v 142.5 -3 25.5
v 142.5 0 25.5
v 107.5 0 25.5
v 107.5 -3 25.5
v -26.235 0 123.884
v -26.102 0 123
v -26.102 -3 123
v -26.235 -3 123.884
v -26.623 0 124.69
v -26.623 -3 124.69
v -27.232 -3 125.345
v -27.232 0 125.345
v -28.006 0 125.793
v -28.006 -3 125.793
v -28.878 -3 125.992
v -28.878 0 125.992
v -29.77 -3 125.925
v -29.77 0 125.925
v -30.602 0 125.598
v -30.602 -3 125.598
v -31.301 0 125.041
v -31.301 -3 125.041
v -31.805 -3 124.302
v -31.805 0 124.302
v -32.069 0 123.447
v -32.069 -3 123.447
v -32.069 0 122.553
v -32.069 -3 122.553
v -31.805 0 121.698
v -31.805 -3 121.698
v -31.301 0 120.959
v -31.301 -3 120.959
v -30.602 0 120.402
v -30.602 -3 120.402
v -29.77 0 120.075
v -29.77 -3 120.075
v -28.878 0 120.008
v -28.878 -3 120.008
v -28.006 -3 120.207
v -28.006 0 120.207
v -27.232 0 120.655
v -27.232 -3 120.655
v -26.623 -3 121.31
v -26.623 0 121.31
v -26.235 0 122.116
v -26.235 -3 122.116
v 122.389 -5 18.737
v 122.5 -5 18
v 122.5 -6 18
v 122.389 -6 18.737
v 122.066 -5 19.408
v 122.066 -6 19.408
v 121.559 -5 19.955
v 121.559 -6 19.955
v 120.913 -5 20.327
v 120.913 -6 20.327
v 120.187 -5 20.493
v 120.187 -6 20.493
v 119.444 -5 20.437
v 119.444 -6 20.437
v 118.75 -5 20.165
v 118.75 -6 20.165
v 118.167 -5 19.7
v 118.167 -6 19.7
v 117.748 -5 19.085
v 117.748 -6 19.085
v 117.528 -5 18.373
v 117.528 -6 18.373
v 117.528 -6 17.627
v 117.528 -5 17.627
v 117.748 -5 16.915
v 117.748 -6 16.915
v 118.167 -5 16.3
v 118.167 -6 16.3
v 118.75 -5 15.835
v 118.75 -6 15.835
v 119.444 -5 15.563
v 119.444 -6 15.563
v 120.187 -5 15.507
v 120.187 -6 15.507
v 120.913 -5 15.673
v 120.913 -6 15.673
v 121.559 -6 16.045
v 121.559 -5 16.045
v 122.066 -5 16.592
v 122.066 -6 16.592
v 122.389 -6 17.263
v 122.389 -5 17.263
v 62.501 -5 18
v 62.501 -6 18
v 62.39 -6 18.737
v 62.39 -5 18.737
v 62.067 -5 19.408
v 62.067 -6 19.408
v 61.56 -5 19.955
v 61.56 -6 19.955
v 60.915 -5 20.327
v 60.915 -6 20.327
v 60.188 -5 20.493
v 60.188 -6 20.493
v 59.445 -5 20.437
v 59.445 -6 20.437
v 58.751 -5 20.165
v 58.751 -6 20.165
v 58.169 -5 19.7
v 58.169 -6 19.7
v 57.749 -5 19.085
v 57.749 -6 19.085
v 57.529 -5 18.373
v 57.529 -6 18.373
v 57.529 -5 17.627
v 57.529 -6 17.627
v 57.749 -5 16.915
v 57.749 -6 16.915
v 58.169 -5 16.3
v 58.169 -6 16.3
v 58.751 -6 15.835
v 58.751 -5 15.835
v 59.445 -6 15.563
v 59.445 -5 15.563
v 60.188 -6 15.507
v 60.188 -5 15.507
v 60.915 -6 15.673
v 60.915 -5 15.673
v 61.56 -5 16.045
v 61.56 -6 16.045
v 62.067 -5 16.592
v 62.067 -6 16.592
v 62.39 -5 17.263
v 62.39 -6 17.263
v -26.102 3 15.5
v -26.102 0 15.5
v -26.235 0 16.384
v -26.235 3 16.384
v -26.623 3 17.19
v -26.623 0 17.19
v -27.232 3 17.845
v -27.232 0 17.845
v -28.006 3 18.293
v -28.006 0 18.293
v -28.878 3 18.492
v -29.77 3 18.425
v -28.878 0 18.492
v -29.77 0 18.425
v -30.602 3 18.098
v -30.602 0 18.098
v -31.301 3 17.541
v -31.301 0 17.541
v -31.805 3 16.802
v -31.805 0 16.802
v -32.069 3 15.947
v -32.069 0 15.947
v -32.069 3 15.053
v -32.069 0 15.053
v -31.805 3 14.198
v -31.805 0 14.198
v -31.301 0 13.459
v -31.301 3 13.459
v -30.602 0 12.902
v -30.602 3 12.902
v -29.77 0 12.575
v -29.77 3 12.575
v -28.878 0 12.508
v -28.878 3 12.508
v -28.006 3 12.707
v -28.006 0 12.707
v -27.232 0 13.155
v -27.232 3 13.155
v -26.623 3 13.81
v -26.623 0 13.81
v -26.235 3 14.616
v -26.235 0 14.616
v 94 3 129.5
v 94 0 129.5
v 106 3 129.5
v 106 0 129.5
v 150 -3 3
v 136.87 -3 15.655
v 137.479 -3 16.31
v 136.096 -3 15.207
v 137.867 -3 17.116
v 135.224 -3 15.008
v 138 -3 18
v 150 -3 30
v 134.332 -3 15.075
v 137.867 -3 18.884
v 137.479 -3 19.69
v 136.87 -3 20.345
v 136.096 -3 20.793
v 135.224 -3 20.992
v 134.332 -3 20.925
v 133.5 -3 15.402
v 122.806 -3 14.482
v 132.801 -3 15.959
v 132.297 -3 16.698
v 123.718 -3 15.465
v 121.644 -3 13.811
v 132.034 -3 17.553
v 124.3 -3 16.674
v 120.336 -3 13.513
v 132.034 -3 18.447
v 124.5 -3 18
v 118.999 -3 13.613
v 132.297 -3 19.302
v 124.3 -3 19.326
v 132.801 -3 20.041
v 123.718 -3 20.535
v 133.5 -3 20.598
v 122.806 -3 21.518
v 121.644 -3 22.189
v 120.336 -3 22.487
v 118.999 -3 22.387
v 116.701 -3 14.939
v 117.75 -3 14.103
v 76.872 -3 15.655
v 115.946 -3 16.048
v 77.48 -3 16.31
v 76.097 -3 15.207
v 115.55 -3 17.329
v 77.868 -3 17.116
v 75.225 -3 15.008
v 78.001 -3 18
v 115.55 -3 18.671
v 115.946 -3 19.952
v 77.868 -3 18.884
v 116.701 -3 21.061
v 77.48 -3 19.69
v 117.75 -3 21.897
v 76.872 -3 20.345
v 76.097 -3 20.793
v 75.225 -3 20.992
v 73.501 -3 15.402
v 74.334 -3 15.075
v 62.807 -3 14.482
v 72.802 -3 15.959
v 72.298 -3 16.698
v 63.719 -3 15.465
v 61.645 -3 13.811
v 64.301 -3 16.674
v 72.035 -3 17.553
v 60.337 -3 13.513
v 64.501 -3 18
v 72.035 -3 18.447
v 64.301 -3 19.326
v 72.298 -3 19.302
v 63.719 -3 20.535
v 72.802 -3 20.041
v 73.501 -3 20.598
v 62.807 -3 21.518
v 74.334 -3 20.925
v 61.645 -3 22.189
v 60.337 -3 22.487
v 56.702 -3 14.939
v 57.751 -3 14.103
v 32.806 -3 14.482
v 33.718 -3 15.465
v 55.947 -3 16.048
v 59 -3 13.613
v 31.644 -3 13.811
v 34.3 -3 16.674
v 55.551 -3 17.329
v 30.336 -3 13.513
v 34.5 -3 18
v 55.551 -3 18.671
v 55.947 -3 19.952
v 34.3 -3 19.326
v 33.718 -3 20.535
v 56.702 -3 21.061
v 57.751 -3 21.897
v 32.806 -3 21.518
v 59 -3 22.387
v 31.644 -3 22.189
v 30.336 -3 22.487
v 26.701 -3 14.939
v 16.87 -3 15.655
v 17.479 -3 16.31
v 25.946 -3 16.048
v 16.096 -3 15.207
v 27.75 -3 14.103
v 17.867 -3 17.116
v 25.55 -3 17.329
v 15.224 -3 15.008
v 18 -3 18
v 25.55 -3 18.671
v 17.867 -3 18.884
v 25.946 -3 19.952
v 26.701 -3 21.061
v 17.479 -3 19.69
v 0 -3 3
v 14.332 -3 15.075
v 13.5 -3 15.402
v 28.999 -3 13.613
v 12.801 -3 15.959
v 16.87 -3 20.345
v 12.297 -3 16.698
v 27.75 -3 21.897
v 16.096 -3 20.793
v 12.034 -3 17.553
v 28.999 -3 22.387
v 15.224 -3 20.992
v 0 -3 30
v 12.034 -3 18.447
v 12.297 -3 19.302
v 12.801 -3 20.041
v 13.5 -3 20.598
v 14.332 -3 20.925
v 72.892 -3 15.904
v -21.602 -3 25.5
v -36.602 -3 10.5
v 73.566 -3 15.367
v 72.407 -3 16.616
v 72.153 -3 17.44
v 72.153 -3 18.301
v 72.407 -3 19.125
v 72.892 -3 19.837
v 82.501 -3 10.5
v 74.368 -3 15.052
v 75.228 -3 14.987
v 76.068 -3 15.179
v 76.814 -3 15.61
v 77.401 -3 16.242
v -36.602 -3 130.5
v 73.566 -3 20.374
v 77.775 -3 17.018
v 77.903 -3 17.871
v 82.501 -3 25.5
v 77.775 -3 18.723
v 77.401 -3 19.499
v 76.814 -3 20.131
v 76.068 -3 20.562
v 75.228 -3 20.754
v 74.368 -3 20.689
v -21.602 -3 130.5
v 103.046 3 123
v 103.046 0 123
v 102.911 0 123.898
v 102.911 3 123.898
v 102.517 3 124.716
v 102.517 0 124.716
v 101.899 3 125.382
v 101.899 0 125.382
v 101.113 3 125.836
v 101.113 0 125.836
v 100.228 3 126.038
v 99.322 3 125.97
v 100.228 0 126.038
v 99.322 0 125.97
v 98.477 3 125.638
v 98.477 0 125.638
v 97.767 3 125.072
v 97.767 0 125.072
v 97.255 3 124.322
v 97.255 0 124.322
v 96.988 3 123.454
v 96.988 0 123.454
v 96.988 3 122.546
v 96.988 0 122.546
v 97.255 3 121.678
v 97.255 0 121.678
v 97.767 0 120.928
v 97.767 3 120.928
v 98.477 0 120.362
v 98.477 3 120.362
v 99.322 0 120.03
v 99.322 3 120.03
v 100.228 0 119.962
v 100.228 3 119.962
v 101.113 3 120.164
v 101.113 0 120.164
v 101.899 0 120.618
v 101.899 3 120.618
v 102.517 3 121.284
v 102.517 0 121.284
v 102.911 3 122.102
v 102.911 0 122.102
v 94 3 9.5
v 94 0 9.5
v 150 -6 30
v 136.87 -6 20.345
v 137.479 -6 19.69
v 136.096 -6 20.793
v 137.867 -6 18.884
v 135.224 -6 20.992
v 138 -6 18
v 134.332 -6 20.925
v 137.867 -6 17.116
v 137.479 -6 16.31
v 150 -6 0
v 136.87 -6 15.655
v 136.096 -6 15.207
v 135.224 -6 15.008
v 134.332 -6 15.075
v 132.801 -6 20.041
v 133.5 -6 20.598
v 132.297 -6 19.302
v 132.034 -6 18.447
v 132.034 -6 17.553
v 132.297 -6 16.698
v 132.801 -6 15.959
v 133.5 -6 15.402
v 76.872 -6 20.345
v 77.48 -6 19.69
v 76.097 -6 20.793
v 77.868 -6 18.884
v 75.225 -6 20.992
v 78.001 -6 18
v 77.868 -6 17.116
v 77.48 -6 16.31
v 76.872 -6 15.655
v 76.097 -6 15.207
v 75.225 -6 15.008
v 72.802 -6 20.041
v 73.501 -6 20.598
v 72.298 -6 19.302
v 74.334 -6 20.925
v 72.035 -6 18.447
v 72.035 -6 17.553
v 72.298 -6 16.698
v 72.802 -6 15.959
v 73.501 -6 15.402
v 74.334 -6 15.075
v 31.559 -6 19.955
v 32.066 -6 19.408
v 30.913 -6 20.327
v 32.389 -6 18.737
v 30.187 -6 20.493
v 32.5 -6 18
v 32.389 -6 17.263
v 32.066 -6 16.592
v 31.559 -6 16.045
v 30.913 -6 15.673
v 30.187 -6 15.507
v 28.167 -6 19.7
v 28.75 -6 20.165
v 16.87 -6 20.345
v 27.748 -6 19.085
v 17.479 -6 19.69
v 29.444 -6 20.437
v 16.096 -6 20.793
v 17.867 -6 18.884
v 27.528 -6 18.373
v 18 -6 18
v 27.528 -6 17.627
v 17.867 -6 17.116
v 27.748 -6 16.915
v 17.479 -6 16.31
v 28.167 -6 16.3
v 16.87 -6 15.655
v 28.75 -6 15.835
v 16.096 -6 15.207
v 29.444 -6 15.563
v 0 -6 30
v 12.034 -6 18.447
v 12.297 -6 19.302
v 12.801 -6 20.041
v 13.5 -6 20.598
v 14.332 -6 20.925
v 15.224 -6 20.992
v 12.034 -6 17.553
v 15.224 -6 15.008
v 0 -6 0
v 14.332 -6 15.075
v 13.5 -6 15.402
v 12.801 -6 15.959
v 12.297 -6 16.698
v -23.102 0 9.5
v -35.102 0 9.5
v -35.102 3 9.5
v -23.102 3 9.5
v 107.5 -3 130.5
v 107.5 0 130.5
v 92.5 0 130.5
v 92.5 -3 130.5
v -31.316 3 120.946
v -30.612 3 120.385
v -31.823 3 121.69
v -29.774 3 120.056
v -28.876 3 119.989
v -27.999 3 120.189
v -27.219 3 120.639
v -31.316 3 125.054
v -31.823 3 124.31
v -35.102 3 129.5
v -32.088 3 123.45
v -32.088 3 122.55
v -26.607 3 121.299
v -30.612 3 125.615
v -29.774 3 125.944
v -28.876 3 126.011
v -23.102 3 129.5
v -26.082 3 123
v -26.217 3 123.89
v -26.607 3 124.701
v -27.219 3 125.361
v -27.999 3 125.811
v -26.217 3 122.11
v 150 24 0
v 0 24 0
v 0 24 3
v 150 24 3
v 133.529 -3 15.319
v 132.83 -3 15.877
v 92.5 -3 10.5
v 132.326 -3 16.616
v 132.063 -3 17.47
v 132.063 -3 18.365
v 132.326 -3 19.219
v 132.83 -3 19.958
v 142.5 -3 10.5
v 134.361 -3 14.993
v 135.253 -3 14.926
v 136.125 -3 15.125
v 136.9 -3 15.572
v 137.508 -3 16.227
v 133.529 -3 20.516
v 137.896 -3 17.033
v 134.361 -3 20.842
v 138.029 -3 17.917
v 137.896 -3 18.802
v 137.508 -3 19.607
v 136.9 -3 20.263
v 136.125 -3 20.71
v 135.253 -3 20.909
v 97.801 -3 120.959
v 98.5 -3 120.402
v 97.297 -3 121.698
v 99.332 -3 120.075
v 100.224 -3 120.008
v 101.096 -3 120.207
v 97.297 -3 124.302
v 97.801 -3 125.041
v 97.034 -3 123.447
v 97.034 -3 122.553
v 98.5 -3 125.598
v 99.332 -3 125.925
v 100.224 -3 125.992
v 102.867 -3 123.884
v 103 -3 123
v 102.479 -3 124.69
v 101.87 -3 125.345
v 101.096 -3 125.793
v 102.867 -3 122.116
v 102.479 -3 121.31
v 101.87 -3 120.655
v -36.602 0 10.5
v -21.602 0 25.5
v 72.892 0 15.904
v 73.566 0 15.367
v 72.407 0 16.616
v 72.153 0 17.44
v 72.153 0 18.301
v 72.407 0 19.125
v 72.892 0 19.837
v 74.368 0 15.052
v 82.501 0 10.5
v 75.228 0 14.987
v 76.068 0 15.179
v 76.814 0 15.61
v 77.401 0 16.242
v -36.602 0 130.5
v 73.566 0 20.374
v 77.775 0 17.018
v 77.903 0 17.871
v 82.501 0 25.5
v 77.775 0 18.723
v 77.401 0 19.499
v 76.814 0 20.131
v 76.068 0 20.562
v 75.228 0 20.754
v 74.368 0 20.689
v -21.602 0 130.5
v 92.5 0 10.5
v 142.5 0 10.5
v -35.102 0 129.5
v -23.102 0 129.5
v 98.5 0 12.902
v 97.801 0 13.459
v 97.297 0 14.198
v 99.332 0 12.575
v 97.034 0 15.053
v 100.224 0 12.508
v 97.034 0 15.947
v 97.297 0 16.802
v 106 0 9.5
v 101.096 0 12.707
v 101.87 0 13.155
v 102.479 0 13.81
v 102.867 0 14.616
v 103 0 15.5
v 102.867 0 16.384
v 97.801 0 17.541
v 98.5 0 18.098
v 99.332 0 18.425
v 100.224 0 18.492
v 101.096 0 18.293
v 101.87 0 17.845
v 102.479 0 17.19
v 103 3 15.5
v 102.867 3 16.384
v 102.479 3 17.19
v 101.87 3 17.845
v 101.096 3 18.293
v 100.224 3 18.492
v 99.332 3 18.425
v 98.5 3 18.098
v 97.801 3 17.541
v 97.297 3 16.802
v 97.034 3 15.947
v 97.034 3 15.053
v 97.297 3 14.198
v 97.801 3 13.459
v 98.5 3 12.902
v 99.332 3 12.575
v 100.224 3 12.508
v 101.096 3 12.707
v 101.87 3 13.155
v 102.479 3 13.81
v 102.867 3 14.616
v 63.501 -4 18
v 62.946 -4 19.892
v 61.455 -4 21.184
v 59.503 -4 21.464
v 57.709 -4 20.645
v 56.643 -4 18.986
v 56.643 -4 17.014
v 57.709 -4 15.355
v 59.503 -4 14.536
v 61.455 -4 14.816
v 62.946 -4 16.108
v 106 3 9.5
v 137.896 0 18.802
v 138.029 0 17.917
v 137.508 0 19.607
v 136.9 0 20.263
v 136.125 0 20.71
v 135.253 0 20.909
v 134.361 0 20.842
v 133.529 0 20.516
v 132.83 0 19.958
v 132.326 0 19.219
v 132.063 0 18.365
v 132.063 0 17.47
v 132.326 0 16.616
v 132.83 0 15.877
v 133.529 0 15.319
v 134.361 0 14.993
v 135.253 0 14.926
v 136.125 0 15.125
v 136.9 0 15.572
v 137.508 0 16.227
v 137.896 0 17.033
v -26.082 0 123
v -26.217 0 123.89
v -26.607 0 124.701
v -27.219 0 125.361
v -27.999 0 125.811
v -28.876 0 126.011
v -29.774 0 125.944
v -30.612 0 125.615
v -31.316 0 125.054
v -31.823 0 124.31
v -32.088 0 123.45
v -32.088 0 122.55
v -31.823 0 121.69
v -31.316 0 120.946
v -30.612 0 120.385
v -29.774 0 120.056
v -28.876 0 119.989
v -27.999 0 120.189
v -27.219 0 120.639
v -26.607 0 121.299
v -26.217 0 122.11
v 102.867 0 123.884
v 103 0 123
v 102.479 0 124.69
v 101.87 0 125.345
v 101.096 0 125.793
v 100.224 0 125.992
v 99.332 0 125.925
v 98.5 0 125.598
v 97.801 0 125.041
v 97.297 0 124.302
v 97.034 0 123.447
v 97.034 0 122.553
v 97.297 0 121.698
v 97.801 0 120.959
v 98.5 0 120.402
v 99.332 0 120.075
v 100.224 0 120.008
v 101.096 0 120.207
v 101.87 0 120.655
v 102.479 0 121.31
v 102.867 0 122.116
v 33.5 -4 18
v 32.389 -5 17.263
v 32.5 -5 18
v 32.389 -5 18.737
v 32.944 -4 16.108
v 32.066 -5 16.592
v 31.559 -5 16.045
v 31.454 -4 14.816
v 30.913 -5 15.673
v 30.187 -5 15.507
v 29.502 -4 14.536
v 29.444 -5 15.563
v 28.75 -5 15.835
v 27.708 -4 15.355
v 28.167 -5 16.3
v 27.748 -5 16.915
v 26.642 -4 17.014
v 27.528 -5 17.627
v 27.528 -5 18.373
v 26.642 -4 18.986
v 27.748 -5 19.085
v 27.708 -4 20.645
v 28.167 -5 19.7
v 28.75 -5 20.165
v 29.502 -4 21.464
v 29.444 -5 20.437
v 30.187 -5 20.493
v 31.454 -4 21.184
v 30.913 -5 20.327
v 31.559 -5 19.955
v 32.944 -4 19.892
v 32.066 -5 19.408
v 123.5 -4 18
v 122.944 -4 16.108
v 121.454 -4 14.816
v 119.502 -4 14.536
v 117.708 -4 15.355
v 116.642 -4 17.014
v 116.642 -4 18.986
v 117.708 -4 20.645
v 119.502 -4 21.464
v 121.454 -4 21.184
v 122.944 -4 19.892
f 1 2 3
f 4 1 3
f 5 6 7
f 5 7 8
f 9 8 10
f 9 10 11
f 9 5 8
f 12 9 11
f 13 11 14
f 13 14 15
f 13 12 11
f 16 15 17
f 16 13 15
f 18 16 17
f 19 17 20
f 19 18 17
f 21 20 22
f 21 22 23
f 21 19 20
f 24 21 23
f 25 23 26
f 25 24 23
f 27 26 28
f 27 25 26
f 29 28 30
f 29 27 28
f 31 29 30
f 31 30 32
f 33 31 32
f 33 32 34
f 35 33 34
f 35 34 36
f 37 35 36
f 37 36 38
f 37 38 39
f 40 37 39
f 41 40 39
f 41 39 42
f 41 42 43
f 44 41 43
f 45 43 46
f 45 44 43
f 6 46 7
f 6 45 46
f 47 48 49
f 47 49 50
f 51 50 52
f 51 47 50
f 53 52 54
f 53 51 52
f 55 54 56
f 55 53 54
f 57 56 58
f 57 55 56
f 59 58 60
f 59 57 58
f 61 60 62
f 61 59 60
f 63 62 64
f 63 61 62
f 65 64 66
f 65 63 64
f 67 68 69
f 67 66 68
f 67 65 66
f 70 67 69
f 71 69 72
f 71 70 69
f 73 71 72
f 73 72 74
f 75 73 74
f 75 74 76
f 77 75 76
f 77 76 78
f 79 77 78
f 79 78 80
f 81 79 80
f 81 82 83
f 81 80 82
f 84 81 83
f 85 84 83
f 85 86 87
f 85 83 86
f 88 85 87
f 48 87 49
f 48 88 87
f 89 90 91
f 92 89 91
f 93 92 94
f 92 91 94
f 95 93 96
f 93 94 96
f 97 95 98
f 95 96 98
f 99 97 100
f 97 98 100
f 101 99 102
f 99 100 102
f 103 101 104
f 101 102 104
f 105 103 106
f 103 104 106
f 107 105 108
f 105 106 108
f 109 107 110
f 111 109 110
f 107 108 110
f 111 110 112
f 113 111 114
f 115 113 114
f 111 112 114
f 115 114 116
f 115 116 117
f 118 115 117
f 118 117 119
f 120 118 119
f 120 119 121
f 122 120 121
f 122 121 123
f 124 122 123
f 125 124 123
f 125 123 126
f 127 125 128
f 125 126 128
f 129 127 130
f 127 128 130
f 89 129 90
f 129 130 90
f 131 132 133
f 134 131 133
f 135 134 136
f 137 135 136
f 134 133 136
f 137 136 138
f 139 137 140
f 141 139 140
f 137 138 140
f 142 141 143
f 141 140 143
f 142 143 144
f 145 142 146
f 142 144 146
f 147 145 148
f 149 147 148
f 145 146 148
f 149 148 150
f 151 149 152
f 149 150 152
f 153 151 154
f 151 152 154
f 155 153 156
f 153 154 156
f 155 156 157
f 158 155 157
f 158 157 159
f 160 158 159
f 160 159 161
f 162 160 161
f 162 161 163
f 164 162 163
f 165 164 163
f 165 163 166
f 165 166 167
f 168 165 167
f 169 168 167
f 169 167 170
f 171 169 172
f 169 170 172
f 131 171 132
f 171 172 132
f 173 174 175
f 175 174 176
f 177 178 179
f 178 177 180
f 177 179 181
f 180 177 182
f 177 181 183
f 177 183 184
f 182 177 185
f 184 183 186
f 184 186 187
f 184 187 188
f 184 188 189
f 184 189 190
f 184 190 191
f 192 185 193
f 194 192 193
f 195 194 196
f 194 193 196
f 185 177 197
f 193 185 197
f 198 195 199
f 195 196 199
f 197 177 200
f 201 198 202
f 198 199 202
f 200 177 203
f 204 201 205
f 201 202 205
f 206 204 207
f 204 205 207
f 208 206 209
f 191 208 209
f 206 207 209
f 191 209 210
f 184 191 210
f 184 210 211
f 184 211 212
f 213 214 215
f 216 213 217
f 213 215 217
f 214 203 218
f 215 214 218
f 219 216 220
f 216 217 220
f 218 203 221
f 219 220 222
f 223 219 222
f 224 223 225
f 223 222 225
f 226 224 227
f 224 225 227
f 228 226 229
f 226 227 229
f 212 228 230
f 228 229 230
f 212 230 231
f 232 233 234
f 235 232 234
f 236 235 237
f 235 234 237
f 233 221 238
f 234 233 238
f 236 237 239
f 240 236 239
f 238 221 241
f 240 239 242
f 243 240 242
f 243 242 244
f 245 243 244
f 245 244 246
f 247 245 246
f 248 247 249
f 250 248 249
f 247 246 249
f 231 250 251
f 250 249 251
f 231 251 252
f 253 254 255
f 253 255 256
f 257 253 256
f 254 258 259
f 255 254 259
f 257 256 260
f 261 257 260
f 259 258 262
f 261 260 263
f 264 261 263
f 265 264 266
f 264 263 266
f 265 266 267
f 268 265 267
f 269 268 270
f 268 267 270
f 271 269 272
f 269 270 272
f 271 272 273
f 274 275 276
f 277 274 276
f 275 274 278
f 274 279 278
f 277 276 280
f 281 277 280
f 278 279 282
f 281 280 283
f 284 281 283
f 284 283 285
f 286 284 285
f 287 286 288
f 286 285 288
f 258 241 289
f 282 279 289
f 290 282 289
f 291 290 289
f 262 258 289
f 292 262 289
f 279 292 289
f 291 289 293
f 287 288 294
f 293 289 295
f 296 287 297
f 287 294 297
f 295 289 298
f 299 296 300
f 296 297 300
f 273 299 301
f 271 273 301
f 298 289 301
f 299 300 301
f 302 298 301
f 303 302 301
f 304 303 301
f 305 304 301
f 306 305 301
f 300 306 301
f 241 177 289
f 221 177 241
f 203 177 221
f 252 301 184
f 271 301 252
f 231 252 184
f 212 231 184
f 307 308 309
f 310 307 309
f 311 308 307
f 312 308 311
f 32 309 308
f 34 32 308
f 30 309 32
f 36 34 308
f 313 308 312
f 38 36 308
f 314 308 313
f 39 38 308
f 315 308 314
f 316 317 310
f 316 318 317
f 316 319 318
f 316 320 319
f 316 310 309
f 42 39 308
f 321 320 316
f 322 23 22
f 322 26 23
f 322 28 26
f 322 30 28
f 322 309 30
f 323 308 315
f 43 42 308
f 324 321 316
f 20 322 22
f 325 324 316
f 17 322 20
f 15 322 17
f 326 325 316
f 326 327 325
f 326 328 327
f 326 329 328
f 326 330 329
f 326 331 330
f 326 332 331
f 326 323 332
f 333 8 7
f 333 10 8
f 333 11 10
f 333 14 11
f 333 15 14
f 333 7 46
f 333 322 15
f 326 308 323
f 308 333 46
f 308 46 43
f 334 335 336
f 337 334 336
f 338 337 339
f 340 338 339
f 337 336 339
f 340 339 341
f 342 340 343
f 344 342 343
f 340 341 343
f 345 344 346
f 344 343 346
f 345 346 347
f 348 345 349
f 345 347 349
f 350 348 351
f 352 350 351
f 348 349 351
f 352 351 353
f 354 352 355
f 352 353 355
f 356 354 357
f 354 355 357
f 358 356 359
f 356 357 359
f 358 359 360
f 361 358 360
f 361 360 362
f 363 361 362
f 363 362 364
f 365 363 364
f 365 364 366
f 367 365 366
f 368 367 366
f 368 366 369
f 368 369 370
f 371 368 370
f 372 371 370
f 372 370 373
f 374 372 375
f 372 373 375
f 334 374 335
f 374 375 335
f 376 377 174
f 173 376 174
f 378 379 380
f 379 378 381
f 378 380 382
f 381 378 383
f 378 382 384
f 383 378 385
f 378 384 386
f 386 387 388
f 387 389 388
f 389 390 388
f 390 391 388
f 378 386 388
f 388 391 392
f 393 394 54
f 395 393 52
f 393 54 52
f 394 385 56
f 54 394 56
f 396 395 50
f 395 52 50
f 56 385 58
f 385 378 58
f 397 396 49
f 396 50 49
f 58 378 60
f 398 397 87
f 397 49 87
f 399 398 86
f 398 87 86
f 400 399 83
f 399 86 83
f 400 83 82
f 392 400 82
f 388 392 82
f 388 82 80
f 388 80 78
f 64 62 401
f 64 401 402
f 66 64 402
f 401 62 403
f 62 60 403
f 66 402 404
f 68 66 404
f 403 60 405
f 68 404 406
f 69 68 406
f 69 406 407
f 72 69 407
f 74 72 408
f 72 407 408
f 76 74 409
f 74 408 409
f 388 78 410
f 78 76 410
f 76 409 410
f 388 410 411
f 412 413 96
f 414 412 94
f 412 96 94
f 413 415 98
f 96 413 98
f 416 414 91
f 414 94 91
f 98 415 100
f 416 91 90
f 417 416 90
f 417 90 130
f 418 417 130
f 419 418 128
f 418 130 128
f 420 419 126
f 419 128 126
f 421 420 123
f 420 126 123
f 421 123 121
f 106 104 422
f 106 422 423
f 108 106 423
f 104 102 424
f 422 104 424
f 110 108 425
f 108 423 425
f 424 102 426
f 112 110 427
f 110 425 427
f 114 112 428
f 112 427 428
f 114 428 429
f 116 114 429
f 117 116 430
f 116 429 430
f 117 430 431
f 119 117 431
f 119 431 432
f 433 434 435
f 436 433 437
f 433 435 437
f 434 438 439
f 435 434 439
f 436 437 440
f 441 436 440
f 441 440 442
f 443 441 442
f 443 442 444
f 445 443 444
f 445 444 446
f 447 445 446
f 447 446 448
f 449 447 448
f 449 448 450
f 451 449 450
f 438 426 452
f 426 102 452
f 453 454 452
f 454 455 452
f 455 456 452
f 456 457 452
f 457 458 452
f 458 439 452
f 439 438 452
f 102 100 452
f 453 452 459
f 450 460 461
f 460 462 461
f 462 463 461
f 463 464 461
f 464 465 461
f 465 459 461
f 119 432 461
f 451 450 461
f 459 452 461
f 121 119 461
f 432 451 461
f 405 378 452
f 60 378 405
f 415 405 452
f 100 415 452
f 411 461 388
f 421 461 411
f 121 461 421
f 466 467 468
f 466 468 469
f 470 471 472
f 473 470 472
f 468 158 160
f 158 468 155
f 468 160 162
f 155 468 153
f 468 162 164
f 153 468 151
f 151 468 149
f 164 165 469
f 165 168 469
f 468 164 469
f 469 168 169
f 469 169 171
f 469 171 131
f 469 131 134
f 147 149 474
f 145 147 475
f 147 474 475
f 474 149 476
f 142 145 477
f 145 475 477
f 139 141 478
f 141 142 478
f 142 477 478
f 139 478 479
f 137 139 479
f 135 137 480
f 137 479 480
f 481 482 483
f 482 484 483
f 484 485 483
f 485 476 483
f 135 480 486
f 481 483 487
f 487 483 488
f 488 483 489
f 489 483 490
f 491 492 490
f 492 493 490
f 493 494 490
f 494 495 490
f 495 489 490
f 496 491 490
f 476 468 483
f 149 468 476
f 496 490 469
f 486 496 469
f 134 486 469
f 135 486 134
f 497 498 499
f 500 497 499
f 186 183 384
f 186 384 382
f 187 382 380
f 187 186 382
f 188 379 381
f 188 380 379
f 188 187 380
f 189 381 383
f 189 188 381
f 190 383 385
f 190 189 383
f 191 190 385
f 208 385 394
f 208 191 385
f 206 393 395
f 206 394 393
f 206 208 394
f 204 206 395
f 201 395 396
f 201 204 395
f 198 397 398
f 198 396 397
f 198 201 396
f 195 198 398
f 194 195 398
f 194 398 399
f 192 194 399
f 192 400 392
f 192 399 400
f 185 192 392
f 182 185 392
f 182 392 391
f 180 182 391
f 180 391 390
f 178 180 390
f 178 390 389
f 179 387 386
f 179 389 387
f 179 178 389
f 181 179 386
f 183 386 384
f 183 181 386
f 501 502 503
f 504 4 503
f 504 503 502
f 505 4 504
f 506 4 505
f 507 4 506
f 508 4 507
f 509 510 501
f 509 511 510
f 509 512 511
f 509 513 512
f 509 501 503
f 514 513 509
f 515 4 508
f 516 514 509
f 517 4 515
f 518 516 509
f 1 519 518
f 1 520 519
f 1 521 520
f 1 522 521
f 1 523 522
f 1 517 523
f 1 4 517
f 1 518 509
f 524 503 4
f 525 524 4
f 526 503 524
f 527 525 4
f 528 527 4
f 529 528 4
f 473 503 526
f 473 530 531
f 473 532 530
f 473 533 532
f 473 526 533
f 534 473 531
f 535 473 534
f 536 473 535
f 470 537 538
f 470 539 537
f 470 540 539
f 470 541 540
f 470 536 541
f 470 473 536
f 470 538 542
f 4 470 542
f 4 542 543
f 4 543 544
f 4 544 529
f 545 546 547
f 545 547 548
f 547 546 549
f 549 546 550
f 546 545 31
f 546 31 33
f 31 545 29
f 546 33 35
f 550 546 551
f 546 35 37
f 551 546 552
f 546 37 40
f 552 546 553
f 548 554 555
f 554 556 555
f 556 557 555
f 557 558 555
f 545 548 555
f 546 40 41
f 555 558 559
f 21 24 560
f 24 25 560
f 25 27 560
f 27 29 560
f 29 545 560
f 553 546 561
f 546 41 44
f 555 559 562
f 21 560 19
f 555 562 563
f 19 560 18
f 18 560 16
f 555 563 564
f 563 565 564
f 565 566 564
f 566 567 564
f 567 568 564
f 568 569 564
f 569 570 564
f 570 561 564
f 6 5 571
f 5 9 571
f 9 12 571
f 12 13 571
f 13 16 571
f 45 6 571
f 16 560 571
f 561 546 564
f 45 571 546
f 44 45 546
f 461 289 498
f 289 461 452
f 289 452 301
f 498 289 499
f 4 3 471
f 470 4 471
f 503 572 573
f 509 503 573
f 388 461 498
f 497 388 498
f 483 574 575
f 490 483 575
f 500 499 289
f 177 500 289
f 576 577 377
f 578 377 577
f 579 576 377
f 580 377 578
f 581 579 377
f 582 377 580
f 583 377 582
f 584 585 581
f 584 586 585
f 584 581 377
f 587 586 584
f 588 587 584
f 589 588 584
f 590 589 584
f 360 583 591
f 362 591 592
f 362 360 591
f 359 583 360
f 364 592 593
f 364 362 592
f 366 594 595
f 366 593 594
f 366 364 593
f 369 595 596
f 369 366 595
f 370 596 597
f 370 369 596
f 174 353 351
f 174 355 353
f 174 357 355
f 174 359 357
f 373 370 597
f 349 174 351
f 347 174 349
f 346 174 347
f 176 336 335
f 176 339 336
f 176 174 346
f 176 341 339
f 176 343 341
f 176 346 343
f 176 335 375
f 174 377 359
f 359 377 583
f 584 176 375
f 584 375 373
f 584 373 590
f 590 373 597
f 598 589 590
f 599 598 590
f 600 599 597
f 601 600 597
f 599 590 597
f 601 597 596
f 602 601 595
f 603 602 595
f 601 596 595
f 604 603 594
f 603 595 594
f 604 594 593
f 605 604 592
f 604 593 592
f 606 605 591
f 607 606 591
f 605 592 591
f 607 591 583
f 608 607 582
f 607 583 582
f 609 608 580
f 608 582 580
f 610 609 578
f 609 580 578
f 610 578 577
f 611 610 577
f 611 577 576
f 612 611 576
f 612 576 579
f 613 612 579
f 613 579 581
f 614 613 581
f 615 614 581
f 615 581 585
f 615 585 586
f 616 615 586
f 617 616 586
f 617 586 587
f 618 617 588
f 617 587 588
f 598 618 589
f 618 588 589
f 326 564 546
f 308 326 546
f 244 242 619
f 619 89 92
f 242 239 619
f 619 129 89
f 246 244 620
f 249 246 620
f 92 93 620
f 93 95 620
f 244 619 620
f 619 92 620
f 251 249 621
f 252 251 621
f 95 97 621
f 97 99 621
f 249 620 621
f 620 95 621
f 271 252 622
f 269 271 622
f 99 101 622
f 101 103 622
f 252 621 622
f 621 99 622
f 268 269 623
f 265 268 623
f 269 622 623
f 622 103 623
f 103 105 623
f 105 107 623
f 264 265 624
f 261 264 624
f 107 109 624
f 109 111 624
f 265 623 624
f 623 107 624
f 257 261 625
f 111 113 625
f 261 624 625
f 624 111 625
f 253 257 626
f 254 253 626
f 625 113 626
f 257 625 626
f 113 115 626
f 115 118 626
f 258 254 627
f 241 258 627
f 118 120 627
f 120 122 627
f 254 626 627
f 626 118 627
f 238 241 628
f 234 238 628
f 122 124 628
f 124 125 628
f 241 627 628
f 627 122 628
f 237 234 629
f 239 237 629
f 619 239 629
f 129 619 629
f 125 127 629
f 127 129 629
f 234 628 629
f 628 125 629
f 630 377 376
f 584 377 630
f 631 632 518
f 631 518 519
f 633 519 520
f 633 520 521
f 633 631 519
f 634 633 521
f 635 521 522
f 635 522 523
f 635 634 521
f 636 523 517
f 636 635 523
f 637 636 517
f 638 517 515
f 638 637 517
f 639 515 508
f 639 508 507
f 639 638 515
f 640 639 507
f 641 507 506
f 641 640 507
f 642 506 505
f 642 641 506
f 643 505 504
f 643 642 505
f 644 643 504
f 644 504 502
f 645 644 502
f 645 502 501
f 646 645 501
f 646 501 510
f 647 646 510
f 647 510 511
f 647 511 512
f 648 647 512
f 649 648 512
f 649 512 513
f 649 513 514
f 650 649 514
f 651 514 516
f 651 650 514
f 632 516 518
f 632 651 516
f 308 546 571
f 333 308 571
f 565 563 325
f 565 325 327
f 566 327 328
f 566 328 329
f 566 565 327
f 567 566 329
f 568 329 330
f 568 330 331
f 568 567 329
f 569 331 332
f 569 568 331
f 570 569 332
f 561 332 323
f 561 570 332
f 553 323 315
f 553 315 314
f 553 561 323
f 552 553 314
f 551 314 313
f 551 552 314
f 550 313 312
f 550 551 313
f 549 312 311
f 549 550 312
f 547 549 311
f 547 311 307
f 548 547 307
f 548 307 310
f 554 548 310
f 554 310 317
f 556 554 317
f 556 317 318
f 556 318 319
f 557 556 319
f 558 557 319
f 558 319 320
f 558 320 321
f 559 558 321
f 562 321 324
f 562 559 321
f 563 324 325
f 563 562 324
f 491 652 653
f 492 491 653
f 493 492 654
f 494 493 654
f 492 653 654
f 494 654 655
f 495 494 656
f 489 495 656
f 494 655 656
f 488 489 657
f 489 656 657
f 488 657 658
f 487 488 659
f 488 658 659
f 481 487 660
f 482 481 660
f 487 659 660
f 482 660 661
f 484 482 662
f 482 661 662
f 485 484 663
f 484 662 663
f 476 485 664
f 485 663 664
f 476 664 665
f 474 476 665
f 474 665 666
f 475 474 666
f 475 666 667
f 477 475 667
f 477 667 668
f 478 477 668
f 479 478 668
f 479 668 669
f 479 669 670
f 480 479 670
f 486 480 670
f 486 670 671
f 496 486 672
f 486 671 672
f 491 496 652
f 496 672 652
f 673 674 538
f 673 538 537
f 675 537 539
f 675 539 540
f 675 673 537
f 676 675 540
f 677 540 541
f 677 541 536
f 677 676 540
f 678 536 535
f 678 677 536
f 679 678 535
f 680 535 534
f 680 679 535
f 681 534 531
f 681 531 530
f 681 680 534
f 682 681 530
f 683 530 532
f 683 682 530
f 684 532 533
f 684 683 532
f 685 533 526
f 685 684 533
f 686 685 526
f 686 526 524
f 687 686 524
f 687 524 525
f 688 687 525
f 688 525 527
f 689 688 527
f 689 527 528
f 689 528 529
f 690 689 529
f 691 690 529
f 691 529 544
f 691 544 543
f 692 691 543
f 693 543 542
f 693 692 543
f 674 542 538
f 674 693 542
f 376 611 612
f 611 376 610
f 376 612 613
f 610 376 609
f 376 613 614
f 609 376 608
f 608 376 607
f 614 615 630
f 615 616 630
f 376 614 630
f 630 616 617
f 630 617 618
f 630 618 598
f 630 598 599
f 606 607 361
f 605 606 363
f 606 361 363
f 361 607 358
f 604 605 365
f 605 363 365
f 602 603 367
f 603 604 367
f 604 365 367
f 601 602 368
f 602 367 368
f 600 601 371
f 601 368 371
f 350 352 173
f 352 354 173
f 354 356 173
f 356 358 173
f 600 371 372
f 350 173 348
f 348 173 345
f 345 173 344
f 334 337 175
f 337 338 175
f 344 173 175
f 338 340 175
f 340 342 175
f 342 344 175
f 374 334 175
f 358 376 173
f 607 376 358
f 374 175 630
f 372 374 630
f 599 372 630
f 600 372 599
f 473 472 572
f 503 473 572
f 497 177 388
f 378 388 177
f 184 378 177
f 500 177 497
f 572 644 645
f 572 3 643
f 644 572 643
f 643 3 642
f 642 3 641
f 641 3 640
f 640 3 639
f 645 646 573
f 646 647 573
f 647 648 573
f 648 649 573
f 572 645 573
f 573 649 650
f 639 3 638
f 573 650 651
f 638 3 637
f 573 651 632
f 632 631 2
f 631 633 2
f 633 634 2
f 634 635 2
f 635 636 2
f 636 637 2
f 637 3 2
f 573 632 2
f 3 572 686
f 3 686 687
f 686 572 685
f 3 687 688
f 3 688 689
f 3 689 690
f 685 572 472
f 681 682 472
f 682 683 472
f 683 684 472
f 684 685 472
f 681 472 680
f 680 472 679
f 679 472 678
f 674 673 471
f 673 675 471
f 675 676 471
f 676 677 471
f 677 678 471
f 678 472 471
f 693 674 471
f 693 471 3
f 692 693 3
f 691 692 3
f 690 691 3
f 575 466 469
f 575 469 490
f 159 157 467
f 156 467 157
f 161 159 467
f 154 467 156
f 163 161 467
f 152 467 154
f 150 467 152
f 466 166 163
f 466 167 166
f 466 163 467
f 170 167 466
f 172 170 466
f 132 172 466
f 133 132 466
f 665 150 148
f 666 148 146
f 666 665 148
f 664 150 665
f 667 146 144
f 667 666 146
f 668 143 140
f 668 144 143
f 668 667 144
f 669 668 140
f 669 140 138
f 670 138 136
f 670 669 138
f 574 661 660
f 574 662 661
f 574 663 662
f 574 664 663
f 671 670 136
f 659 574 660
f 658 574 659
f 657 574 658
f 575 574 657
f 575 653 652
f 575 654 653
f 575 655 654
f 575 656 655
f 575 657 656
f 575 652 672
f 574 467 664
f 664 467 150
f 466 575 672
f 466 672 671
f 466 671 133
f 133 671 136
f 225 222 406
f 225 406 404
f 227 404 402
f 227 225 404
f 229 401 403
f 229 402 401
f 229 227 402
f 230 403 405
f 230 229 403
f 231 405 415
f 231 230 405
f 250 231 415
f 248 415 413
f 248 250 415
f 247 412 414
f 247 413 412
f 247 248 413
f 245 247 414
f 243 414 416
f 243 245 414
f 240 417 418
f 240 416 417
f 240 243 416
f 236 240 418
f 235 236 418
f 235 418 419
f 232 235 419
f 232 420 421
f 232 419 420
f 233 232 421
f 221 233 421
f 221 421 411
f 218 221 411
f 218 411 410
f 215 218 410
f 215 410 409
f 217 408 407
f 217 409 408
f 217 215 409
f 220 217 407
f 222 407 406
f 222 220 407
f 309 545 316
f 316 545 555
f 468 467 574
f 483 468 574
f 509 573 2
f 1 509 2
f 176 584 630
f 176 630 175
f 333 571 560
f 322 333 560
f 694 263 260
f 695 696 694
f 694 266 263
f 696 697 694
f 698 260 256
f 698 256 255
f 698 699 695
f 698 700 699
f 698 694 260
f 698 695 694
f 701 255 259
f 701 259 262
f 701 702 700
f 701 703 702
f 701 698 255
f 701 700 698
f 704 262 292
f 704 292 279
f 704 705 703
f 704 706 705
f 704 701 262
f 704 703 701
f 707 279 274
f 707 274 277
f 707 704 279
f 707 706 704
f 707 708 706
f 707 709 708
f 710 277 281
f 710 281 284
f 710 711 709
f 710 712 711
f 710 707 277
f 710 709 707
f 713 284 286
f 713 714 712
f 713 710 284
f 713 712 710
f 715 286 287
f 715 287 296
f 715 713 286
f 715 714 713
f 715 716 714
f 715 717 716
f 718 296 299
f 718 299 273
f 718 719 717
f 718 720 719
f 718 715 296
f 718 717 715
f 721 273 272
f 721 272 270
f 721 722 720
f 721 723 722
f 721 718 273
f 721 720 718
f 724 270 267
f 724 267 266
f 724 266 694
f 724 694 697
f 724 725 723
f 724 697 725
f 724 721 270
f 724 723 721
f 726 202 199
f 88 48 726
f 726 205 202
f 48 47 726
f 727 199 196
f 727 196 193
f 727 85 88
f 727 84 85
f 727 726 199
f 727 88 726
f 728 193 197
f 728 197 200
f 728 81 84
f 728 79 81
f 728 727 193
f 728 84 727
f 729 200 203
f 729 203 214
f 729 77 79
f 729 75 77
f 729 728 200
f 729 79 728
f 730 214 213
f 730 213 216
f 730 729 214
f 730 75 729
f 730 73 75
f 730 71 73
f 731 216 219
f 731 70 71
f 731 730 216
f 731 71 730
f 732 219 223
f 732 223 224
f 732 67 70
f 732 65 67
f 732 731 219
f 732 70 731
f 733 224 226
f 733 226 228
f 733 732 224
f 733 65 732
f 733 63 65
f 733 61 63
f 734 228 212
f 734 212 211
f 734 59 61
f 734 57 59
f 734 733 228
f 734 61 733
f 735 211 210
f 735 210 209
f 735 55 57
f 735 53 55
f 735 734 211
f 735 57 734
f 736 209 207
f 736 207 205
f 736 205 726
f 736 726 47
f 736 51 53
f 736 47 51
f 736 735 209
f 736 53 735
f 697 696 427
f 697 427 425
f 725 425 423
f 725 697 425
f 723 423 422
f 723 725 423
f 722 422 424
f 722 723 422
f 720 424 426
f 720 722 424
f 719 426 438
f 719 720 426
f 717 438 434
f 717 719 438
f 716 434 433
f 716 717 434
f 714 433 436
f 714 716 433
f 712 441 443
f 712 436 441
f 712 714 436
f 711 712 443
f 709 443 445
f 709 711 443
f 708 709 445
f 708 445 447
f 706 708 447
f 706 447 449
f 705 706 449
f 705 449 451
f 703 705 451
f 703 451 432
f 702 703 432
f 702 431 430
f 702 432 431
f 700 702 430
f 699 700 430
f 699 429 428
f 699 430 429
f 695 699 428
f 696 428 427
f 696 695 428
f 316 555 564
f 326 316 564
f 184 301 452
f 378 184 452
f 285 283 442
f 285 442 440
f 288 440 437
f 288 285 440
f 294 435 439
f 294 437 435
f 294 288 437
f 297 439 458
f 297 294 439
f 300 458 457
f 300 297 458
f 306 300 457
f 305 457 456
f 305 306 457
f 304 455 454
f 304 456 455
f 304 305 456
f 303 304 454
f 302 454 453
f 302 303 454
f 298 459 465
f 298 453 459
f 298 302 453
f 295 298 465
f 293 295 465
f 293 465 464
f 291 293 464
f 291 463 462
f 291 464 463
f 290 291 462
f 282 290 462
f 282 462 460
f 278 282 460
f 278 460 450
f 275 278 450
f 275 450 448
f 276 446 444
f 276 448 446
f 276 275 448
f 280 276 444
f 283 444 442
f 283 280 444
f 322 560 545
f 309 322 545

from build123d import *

# Parameters (mm, degrees)
F1_DEPTH = 150
F2_R     = 3
F2_R_2   = 2.5
F3_DEPTH = 12.5
F4_SIZE  = 2
F5_R     = 3
F6_DEPTH = 3
F5_R_2   = 2.89125585
F7_W     = 12
F7_H     = 120
F7_R     = 3
F7_R_2   = 3.0463073606
F8_DEPTH = 3
F7_R_3   = 3.0195859369


with BuildPart() as f1:
    # F0 (on Right) → F1 (new body)
    with BuildSketch(Plane.YZ):
        Polygon((-3, 30), (-6, 30), (-6, 0), (24, 0), (24, 3), (-3, 3), align=None)
    extrude(amount=F1_DEPTH)

    # F2 (on Front) → F3 (cut, symmetric)
    with BuildSketch(Plane.XZ):
        with Locations((135, 18)):
            Circle(F2_R)
        with Locations((75.0012089281, 18)):
            Circle(F2_R)
        with Locations((15, 18)):
            Circle(F2_R)
        with Locations((120, 18)):
            Circle(F2_R_2)
        with Locations((30, 18)):
            Circle(F2_R_2)
        with Locations((60.0012089281, 18)):
            Circle(F2_R_2)
    extrude(amount=F3_DEPTH, both=True, mode=Mode.SUBTRACT)

    # F4
    f4_edges = [f1.edges().sort_by_distance(p)[0] for p in [
        (57.501209, -3, 18),
        (27.5, -3, 18),
        (117.5, -3, 18),
    ]]
    chamfer(f4_edges, length=F4_SIZE)


with BuildPart() as f6:
    # F5 (on Front) → F6 (new body)
    with BuildSketch(Plane.XZ):
        Polygon((142.5, 10.5), (142.5, 25.5), (107.5, 25.5), (107.5, 130.5), (92.5, 130.5), (92.5, 10.5), align=None)
        with Locations((135.0290626287, 17.9174412042)):
            Circle(F5_R, mode=Mode.SUBTRACT)
        with Locations((100, 123)):
            Circle(F5_R, mode=Mode.SUBTRACT)
    extrude(amount=F6_DEPTH)


with BuildPart() as f6b:
    # F5 (on Front) → F6, piece 2 (new body)
    with BuildSketch(Plane.XZ):
        Polygon((82.5012089281, 10.5), (82.5012089281, 25.5), (-21.6020338073, 25.5), (-21.6020338073, 130.5), (-36.6020338073, 130.5), (-36.6020338073, 10.5), align=None)
        with Locations((75.0117748976, 17.8705621511)):
            Circle(F5_R_2, mode=Mode.SUBTRACT)
        with Locations((-29.1020338073, 123)):
            Circle(F5_R, mode=Mode.SUBTRACT)
    extrude(amount=F6_DEPTH)


with BuildPart() as f8:
    # F7 (on Front) → F8 (new body)
    with BuildSketch(Plane.XZ):
        with Locations((100, 69.5)):
            Rectangle(F7_W, F7_H)
        with Locations((100, 15.5)):
            Circle(F7_R, mode=Mode.SUBTRACT)
        with Locations((100, 123)):
            Circle(F7_R_2, mode=Mode.SUBTRACT)
    extrude(amount=-F8_DEPTH)


with BuildPart() as f8b:
    # F7 (on Front) → F8, piece 2 (new body)
    with BuildSketch(Plane.XZ):
        with Locations((-29.1020338073, 69.5)):
            Rectangle(F7_W, F7_H)
        with Locations((-29.1020338073, 15.5)):
            Circle(F7_R, mode=Mode.SUBTRACT)
        with Locations((-29.1020338073, 123)):
            Circle(F7_R_3, mode=Mode.SUBTRACT)
    extrude(amount=-F8_DEPTH)


solid = Compound([f1.part, f6.part, f6b.part, f8.part, f8b.part])
